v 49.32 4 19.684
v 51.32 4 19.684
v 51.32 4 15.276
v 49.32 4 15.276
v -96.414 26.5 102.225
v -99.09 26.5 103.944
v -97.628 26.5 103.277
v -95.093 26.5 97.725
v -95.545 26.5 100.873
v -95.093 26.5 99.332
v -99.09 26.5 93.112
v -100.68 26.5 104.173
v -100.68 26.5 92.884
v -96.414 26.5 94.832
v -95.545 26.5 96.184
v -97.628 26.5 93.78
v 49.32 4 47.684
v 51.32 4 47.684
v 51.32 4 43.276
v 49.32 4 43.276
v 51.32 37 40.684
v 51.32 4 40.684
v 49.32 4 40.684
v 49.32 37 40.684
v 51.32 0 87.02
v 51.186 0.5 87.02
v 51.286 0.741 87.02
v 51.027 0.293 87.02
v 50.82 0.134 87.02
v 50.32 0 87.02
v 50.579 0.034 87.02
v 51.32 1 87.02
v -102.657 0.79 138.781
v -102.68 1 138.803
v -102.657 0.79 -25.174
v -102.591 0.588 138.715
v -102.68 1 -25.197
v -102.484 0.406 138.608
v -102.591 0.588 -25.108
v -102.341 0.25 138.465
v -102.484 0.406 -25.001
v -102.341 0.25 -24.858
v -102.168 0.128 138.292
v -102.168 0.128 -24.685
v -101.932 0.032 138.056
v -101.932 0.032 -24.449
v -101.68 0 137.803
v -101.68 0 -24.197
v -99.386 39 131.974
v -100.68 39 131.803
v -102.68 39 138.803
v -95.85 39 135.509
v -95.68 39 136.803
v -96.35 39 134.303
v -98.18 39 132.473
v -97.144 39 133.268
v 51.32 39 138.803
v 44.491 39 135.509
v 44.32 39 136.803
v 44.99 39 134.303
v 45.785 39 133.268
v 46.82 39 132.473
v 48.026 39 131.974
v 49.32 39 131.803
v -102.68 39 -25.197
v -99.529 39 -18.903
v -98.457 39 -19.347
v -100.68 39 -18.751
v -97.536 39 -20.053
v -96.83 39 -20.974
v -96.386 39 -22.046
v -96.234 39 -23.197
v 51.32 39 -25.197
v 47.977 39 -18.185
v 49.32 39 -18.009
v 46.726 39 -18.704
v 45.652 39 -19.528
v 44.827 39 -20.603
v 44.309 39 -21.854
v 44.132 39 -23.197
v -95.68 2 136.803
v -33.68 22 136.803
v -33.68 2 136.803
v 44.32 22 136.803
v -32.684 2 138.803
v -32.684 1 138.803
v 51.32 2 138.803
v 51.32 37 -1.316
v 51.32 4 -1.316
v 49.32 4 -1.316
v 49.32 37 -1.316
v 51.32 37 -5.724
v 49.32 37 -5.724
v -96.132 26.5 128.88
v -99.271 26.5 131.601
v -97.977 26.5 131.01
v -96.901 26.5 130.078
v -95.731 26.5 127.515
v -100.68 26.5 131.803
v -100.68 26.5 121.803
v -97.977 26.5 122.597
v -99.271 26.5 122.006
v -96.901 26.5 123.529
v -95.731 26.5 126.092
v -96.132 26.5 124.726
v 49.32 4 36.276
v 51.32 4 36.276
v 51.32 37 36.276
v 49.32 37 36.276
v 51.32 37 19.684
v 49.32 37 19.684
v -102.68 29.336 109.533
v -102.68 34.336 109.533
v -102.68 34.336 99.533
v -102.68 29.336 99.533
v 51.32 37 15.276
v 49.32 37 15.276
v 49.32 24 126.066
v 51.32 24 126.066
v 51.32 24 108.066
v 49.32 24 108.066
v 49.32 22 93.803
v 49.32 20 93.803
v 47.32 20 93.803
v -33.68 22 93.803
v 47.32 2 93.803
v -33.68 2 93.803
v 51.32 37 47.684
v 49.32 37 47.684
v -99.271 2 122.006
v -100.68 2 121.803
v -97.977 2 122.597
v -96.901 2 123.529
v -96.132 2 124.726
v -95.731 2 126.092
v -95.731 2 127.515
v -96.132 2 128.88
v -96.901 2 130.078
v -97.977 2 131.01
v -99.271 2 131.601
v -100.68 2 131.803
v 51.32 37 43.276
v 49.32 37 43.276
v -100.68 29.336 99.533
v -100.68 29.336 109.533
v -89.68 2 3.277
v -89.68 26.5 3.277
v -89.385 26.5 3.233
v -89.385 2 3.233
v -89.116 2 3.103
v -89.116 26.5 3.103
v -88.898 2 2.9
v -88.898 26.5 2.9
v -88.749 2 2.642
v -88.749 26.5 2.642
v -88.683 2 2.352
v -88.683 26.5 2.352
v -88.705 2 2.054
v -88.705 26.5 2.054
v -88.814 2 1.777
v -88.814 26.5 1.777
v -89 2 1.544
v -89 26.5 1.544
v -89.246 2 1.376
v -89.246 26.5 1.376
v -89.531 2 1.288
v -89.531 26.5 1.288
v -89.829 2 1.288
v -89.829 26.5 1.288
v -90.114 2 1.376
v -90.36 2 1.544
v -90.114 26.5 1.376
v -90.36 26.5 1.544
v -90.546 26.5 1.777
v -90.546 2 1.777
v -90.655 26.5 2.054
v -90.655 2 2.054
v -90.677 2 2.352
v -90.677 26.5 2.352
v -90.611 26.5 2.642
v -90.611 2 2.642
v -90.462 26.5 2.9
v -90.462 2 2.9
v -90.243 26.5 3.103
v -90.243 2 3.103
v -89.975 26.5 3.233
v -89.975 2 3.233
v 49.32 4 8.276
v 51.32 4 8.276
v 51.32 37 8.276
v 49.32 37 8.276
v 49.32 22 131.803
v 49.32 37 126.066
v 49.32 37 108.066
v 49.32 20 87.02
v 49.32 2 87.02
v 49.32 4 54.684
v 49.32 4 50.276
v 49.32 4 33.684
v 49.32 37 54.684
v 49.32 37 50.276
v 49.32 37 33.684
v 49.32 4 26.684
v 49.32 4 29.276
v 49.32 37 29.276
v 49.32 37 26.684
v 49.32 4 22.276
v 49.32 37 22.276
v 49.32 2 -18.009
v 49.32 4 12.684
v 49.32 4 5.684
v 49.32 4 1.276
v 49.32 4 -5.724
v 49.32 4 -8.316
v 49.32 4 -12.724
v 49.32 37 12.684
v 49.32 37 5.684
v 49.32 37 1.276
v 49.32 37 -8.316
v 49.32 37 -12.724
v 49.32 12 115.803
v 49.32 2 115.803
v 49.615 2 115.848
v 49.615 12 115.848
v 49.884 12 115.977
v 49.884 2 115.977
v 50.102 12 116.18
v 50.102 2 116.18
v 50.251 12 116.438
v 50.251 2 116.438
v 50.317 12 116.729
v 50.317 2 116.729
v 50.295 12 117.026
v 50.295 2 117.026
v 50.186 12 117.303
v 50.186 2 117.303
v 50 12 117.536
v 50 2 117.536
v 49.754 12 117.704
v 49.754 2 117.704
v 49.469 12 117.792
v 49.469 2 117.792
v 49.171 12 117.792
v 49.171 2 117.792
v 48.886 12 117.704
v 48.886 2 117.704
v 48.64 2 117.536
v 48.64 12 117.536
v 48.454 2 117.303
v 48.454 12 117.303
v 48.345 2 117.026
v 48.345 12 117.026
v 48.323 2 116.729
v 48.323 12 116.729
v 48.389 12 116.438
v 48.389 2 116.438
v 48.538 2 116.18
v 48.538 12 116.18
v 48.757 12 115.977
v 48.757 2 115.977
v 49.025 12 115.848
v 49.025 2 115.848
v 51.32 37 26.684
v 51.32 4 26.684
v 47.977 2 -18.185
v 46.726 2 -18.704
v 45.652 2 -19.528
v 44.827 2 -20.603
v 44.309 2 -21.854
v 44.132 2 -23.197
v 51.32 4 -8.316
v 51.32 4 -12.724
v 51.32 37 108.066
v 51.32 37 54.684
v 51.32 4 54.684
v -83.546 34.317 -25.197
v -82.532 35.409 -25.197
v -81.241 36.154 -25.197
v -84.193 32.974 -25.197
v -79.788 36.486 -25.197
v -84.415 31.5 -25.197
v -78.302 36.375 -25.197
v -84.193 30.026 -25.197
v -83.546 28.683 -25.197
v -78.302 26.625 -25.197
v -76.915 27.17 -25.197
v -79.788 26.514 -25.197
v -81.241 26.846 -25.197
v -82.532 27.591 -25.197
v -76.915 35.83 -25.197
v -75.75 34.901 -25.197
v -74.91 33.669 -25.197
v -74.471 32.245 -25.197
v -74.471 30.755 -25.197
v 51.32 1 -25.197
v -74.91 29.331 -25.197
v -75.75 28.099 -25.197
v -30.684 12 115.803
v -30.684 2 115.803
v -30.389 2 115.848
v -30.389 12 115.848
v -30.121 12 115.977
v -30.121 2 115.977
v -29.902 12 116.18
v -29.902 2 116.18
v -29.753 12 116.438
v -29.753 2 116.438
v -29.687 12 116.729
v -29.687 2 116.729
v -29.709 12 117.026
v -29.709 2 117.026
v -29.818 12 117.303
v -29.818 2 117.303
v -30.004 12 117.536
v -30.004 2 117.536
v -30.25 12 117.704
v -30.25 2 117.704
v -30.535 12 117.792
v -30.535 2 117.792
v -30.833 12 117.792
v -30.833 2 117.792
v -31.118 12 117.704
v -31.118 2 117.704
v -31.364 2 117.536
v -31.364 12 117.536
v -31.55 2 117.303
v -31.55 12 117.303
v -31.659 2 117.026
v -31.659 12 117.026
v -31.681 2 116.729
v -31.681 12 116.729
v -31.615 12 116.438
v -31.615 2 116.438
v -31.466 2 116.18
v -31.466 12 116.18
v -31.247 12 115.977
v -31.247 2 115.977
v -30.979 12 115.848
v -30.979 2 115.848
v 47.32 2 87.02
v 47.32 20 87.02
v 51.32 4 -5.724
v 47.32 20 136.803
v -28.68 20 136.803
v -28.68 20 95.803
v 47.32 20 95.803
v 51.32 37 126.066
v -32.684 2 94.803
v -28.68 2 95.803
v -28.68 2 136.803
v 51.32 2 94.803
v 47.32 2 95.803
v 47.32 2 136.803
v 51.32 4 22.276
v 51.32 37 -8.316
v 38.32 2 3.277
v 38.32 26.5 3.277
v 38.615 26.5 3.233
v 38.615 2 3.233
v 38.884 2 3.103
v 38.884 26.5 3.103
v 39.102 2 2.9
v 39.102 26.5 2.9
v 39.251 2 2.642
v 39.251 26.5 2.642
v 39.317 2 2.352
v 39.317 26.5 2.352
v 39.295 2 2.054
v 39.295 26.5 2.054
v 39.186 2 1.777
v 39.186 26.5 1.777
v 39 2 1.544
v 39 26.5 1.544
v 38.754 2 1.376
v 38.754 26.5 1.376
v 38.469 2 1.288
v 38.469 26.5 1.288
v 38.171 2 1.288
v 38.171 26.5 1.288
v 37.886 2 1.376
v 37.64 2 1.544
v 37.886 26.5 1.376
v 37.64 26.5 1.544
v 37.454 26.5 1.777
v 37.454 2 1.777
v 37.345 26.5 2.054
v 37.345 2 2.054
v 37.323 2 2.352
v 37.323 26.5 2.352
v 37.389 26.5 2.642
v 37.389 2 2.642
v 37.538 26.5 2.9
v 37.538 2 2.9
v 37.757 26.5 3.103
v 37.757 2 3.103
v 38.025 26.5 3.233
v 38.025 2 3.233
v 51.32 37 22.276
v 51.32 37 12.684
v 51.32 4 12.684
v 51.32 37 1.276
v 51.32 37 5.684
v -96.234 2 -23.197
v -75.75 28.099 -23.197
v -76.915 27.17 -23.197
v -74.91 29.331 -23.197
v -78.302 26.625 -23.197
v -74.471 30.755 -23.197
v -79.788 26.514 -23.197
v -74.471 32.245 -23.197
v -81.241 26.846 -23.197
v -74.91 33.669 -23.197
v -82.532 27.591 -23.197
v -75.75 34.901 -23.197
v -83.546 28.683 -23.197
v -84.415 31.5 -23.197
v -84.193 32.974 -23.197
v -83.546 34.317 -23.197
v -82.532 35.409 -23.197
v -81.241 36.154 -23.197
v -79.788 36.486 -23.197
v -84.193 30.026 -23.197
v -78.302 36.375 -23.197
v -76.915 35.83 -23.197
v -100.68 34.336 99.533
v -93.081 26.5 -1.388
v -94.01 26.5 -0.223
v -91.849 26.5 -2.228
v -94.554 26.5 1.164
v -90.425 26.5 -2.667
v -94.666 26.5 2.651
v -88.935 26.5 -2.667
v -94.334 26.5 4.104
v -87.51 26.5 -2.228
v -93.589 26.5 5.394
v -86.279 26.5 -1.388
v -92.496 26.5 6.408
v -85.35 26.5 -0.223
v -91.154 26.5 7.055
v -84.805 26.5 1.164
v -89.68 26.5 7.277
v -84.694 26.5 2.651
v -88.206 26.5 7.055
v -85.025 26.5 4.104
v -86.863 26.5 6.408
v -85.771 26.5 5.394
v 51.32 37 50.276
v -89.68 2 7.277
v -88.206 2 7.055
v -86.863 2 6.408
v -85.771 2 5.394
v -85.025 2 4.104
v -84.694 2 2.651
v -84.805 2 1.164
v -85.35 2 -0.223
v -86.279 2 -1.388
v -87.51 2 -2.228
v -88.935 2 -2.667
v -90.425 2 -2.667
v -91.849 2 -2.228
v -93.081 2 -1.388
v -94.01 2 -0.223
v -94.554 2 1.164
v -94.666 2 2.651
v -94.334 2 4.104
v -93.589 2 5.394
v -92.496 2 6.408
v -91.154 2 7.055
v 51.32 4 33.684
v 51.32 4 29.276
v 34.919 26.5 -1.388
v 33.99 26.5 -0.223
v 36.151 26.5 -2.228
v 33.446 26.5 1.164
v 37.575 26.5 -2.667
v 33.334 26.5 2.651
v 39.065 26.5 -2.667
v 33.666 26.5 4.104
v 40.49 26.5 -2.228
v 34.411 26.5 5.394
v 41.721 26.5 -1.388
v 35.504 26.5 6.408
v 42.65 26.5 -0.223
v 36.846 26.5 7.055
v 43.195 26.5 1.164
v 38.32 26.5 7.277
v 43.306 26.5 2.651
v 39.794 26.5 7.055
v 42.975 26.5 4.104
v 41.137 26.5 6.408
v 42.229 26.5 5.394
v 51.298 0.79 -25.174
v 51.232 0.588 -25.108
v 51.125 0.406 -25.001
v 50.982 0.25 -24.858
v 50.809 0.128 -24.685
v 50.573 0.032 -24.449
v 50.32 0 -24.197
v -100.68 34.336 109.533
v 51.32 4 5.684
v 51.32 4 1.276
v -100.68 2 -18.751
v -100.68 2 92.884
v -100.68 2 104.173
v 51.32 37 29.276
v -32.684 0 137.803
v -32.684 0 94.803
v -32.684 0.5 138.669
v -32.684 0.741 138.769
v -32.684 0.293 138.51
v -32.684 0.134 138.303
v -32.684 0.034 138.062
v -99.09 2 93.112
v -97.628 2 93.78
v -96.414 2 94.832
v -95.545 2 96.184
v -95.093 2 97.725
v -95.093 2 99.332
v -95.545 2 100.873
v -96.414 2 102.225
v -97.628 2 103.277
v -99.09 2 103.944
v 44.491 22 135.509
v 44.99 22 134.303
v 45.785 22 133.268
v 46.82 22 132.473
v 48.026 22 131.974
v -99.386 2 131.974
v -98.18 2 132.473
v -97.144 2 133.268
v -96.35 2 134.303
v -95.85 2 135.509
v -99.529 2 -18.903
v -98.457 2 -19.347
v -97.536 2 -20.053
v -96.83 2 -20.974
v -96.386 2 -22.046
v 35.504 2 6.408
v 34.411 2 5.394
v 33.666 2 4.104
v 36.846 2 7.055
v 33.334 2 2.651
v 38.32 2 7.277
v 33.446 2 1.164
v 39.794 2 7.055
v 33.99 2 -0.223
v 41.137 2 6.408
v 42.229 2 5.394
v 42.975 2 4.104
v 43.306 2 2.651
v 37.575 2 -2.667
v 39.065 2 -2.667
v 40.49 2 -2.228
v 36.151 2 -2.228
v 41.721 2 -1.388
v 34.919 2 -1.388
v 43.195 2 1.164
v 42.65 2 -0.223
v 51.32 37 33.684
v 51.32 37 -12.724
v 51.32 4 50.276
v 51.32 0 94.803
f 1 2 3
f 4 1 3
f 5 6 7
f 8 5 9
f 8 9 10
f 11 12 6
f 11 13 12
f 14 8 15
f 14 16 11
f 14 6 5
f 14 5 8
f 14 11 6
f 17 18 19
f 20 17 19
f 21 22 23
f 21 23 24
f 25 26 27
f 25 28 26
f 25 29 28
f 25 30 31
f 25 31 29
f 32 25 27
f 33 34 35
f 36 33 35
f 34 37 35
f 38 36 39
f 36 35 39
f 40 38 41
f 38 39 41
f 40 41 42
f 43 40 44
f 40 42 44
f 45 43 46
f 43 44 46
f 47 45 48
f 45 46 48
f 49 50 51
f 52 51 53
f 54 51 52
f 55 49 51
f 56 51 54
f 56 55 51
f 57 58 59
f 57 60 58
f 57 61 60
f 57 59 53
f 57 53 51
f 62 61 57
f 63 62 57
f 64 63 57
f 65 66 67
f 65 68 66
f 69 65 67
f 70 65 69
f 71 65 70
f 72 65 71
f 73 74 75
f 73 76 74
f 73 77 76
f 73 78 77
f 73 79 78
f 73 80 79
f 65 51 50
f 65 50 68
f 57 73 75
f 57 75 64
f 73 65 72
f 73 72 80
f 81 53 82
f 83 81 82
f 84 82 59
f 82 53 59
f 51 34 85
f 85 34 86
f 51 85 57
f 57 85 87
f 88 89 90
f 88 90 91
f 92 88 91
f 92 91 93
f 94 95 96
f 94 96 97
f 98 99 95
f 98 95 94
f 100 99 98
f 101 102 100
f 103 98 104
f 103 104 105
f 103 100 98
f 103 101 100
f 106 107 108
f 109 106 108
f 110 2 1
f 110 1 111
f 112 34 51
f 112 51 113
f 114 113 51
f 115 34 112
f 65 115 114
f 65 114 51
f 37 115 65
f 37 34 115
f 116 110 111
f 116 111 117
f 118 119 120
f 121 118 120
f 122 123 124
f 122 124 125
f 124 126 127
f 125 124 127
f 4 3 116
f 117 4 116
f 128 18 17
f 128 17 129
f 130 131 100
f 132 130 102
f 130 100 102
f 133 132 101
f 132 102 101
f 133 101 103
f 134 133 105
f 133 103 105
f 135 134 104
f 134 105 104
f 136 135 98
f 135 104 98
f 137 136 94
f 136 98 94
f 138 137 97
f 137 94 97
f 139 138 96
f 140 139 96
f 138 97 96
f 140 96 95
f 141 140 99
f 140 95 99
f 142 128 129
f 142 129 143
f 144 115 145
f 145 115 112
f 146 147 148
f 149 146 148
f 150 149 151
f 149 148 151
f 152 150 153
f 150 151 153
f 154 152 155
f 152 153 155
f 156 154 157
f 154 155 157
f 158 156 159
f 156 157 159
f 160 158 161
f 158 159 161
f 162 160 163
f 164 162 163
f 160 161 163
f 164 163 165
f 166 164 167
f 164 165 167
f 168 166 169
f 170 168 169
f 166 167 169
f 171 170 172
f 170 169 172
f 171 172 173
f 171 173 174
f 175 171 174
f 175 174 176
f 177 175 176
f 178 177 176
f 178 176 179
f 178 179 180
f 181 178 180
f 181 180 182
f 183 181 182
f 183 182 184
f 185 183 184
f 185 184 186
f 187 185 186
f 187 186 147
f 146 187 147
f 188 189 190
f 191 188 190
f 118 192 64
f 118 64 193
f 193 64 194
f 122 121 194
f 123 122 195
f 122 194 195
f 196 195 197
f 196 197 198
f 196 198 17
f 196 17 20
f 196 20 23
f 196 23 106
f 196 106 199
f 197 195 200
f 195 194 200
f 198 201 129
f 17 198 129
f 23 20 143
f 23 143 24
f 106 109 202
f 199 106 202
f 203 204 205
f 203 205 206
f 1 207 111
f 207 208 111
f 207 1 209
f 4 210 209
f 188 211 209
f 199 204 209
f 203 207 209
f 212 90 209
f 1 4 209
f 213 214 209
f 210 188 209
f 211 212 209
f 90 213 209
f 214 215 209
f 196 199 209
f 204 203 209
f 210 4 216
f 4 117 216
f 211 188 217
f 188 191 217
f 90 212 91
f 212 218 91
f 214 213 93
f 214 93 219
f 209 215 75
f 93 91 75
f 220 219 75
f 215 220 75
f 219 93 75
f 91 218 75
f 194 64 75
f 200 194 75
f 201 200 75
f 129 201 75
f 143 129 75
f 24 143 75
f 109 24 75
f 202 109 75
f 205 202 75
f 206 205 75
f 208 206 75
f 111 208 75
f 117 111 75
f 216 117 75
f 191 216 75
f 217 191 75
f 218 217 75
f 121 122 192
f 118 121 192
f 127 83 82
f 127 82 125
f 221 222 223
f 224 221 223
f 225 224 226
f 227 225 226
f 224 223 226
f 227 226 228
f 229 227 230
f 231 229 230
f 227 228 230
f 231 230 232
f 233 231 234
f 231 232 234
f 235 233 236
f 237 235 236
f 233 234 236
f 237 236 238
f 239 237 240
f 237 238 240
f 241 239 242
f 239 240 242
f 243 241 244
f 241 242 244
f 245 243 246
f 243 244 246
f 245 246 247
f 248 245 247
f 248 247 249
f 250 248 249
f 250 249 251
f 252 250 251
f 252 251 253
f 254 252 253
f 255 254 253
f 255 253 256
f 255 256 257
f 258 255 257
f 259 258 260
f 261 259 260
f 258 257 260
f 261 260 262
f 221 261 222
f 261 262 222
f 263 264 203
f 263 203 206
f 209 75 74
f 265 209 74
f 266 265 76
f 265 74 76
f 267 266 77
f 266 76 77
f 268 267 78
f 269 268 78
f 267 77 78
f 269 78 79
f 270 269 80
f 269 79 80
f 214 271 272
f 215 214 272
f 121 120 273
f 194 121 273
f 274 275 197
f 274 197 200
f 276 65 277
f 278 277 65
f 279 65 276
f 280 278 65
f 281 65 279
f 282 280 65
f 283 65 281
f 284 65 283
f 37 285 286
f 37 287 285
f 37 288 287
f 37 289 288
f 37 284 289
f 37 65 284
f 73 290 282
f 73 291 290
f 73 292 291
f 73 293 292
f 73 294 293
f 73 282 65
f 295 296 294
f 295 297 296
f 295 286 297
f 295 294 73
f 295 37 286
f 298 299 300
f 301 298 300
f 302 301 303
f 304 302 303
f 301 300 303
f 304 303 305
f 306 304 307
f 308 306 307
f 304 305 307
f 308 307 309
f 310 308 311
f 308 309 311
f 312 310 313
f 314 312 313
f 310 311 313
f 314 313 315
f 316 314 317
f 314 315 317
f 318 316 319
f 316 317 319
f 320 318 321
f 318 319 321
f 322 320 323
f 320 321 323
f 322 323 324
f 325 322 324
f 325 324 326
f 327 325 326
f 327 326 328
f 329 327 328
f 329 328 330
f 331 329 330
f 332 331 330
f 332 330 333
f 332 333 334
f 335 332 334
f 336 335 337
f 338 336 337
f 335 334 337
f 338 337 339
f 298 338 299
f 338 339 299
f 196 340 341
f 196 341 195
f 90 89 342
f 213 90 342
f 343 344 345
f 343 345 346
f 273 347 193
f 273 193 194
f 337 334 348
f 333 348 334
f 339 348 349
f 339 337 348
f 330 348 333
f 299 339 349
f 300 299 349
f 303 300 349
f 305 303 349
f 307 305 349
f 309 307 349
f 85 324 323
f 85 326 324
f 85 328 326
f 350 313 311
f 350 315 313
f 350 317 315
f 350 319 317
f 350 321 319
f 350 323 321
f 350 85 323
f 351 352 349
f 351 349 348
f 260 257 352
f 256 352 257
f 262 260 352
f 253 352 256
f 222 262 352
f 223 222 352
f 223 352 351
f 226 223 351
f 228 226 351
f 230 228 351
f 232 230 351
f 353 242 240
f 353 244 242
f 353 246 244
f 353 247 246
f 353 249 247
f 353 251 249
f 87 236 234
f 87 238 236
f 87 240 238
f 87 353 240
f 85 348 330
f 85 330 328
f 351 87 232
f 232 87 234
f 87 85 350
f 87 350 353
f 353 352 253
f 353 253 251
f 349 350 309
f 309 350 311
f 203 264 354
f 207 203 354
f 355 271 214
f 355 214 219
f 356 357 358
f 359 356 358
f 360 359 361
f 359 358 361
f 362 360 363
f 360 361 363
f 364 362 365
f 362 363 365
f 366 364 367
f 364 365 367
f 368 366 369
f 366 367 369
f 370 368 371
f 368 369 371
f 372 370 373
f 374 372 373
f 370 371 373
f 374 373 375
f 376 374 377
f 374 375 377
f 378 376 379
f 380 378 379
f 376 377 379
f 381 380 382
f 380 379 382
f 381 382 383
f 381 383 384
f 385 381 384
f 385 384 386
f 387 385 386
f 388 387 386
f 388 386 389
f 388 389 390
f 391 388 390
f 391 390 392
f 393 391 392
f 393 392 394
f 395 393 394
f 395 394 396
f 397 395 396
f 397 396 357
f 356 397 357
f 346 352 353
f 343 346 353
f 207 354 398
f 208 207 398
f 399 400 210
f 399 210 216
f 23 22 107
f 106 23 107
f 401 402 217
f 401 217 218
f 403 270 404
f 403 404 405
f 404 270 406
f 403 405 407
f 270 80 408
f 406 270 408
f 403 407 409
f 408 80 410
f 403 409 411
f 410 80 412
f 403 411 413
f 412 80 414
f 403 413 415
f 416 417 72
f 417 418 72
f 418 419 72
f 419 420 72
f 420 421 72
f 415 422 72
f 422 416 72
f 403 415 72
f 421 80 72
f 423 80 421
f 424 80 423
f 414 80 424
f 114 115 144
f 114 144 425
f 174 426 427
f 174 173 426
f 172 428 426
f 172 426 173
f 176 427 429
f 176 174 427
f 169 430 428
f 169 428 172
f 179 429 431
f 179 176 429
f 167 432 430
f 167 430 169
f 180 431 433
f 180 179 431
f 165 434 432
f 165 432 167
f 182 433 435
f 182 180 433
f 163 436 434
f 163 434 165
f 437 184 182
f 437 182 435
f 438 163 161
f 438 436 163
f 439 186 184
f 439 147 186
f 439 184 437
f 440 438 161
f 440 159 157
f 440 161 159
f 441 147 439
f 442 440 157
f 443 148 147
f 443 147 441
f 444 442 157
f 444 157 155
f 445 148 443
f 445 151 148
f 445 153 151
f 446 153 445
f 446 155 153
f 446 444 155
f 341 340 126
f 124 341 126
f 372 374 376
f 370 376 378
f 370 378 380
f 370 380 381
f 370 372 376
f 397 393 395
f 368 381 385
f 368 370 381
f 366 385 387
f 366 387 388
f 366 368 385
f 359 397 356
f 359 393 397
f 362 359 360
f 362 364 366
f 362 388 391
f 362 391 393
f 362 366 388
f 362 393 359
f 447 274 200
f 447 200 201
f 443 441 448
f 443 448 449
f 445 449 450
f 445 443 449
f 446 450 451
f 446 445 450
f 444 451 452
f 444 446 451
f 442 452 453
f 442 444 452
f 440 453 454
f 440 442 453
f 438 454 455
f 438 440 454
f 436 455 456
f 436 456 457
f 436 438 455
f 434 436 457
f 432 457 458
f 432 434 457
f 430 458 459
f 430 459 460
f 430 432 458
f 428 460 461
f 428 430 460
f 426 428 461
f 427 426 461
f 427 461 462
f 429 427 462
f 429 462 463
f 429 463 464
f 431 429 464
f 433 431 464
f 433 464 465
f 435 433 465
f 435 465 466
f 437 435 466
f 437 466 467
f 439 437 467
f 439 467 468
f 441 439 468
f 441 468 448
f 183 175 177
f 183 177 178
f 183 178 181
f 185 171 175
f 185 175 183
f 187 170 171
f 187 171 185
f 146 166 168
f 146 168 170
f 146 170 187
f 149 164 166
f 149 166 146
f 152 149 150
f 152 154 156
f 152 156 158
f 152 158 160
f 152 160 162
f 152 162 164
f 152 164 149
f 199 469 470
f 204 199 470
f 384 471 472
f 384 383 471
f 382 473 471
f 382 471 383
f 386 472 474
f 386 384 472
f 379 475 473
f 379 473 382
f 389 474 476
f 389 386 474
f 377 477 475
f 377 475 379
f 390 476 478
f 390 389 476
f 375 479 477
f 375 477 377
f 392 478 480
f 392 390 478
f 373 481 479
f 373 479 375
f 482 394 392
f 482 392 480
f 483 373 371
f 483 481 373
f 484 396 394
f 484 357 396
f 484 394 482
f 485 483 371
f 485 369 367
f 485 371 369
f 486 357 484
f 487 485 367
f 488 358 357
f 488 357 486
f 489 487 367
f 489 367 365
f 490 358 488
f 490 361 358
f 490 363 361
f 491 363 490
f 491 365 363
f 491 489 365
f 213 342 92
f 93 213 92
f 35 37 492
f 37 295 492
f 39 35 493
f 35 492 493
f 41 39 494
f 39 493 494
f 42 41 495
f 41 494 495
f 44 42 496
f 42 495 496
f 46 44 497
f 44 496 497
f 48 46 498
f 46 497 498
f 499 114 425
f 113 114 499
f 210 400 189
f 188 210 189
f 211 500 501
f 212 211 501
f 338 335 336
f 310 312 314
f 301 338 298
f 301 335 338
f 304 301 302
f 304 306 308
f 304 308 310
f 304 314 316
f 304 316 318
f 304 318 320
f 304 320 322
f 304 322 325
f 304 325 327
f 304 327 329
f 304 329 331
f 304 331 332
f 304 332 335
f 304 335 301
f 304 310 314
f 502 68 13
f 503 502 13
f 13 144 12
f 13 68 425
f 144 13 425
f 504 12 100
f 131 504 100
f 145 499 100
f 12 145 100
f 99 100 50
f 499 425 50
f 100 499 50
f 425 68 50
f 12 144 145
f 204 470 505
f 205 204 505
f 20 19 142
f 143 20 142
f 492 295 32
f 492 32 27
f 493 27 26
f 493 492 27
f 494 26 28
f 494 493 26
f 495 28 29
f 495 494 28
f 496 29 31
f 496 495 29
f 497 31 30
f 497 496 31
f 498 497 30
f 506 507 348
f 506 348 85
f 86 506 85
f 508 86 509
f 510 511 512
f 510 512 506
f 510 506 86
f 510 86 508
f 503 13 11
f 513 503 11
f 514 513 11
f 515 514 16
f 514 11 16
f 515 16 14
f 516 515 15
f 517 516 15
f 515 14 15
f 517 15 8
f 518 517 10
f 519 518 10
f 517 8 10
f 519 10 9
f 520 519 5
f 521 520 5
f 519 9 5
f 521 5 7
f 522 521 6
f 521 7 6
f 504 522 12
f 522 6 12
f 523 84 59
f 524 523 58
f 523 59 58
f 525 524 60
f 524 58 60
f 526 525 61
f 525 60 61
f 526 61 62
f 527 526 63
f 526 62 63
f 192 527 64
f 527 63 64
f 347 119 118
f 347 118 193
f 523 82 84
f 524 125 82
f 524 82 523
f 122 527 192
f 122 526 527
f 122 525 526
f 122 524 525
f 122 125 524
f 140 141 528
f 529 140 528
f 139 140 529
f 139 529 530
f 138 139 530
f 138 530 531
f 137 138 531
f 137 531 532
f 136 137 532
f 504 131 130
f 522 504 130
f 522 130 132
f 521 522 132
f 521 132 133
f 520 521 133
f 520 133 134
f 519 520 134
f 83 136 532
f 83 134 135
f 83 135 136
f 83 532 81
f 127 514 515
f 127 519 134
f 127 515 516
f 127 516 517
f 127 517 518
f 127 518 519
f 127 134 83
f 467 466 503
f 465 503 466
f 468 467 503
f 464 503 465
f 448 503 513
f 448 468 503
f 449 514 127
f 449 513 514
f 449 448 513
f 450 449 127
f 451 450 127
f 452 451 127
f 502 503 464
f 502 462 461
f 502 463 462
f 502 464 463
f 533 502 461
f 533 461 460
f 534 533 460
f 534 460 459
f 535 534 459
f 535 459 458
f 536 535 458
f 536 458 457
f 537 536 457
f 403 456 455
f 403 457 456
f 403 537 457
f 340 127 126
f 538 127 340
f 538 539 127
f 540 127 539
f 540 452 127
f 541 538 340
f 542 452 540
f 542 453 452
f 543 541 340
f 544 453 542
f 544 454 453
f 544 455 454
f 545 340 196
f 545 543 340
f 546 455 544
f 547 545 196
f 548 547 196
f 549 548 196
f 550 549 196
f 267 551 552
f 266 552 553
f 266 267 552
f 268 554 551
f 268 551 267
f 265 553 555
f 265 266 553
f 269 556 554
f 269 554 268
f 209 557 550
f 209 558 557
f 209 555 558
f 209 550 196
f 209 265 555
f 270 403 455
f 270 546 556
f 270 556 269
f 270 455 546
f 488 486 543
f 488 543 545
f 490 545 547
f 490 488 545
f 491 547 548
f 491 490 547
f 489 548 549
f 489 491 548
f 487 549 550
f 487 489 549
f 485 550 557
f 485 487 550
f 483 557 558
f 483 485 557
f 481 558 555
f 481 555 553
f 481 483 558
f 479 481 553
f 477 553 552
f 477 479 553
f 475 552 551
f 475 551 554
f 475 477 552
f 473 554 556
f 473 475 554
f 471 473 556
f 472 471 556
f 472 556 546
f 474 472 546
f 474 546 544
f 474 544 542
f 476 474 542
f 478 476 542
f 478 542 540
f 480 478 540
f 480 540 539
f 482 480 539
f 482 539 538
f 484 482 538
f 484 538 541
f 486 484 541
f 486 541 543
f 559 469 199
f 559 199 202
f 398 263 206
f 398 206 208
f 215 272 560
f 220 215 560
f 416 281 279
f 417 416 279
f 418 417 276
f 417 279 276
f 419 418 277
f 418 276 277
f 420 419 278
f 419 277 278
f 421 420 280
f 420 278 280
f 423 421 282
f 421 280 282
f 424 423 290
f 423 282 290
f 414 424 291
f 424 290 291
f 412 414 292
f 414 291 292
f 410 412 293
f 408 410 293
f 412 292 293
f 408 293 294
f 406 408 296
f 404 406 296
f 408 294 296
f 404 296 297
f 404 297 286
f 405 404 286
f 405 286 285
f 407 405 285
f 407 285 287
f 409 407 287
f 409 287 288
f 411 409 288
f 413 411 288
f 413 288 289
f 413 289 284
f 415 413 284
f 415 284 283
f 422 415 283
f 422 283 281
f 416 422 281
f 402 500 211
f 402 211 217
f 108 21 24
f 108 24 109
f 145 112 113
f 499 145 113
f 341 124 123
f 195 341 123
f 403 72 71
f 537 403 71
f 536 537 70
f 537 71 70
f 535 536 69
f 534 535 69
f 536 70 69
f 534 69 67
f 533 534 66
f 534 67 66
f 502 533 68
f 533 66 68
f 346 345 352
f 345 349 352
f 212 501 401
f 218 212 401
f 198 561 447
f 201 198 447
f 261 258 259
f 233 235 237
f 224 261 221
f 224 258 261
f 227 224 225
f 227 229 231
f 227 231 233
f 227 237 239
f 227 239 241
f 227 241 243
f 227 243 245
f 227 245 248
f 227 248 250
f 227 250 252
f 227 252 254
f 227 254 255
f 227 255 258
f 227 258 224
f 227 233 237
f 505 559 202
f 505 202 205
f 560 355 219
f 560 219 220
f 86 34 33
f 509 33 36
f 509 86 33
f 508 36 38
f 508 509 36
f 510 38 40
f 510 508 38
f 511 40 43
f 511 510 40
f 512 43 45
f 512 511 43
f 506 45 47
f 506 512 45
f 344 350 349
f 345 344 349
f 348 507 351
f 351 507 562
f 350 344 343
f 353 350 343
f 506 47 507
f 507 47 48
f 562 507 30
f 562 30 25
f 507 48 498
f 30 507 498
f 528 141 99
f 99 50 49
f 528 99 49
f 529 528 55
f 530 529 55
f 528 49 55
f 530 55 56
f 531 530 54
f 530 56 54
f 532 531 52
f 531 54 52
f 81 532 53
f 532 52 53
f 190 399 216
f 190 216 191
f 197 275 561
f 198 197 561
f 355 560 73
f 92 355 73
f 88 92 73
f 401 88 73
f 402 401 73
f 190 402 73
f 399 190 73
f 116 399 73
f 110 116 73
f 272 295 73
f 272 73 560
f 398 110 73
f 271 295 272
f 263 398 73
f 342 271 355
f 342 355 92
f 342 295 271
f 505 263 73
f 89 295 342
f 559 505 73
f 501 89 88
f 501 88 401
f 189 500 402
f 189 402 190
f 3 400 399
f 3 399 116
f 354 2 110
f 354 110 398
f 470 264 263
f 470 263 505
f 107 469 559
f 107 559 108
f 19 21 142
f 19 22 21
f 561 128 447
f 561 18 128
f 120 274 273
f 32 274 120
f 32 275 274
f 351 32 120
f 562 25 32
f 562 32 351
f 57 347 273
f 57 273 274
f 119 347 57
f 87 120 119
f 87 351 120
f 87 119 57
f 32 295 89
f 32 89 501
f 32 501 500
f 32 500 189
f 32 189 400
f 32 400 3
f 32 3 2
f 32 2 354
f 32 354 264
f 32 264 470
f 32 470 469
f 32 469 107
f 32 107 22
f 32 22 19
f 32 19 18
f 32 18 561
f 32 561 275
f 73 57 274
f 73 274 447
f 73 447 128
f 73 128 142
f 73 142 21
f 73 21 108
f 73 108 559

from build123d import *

# Parameters (mm, degrees)
SKETCH1_W               = 154
SKETCH1_H               = 164
BOSS_EXTRUDE1_DEPTH     = 39
FILLET2_R               = 1
SKETCH2_R               = 5
SKETCH2_R_2             = 1
CUT_EXTRUDE1_DEPTH      = 37
CUT_EXTRUDE2_DEPTH      = 178.004271116
CUT_EXTRUDE2_DEPTH_BACK = 12.5
SKETCH3_R               = 5
SKETCH4_W               = 76
SKETCH4_H               = 41
CUT_EXTRUDE3_DEPTH      = 20
SKETCH5_W               = 80
SKETCH5_H               = 2
BOSS_EXTRUDE2_DEPTH     = 18
SKETCH7_W               = 85
SKETCH7_H               = 45
BOSS_EXTRUDE3_DEPTH     = 2
SKETCH8_W               = 18
SKETCH8_H               = 13
CUT_EXTRUDE4_DEPTH      = 3
SKETCH10_W              = 4
SKETCH10_H              = 51.783631986
BOSS_EXTRUDE4_DEPTH     = 20
SKETCH11_W              = 84.004327952
SKETCH11_H              = 44
CUT_EXTRUDE8_DEPTH      = 2
SKETCH12_W              = 4.408390859
SKETCH12_H              = 33
CUT_EXTRUDE9_DEPTH      = 3
SKETCH13_R              = 5
CUT_EXTRUDE10_DEPTH     = 10
SKETCH14_W              = 10
SKETCH14_H              = 5
CUT_EXTRUDE11_DEPTH     = 10
SKETCH15_R              = 1
CUT_EXTRUDE12_DEPTH     = 10


with BuildPart() as part:
    # Sketch1 → Boss-Extrude1 (new body)
    with BuildSketch(Plane(origin=(0, 0, 0), x_dir=(1, 0, 0), z_dir=(0, 1, 0))):
        with Locations((-25.679775281, -56.803370787)):
            Rectangle(SKETCH1_W, SKETCH1_H)
    extrude(amount=BOSS_EXTRUDE1_DEPTH)

    # Fillet2
    fillet2_edges = [part.edges().sort_by_distance(p)[0] for p in [
        (-25.679775281, 0, -25.196629213),
        (51.320224719, 0, 56.803370787),
        (-25.679775281, 0, 138.803370787),
        (-102.679775281, 0, 56.803370787),
    ]]
    fillet(fillet2_edges, radius=FILLET2_R)

    # Sketch2 → Cut-Extrude1 (cut)
    # profile 1 of 3: a face of its own
    with BuildSketch(Plane(origin=(0, 39, 0), x_dir=(1, 0, 0), z_dir=(0, 1, 0))):
        with BuildLine():
            Line((44.132250696, 23.196629213), (-96.23424538, 23.196629213))
            ThreePointArc((-96.23424538, 23.196629213), (-97.536310942, 20.053164875), (-100.679775281, 18.751099313))
            Line((-100.679775281, 18.751099313), (-100.679775281, -92.88384898))
            ThreePointArc((-100.679775281, -92.88384898), (-95.035253474, -98.528370787), (-100.679775281, -104.172892593))
            Line((-100.679775281, -104.172892593), (-100.679775281, -121.803370787))
            ThreePointArc((-100.679775281, -121.803370787), (-95.679775281, -126.803370787), (-100.679775281, -131.803370787))
            ThreePointArc((-100.679775281, -131.803370787), (-97.144241375, -133.267836881), (-95.679775281, -136.803370787))
            Line((-95.679775281, -136.803370787), (44.320224719, -136.803370787))
            ThreePointArc((44.320224719, -136.803370787), (45.784690813, -133.267836881), (49.320224719, -131.803370787))
            Line((49.320224719, -131.803370787), (49.320224719, 18.00865519))
            ThreePointArc((49.320224719, 18.00865519), (45.651773106, 19.528177601), (44.132250696, 23.196629213))
        make_face()
        with Locations(Location((-89.679775281, -2.276961684, 0), (0, 0, 270))):
            Circle(SKETCH2_R, mode=Mode.SUBTRACT)
        with Locations(Location((38.320224719, -2.276961684, 0), (0, 0, 270))):
            Circle(SKETCH2_R, mode=Mode.SUBTRACT)
    # profile 2 of 3: a face of its own
    with BuildSketch(Plane(origin=(0, 39, 0), x_dir=(1, 0, 0), z_dir=(0, 1, 0))):
        with Locations(Location((-89.679775281, -2.276961684, 0), (0, 0, 270))):
            Circle(SKETCH2_R_2)
    # profile 3 of 3: a face of its own
    with BuildSketch(Plane(origin=(0, 39, 0), x_dir=(1, 0, 0), z_dir=(0, 1, 0))):
        with Locations(Location((38.320224719, -2.276961684, 0), (0, 0, 270))):
            Circle(SKETCH2_R_2)
    extrude(amount=-CUT_EXTRUDE1_DEPTH, mode=Mode.SUBTRACT)

    # Sketch3 → Cut-Extrude2 (cut, two sides: drawn at the far end of the back side and taken through both)
    with BuildSketch(Plane(origin=(0, 39, 0), x_dir=(1, 0, 0), z_dir=(0, 1, 0)).offset(-CUT_EXTRUDE2_DEPTH_BACK)):
        with Locations(Location((-89.679775281, -2.276961684, 0), (0, 0, 270))):
            Circle(SKETCH3_R)
        with Locations(Location((38.320224719, -2.276961684, 0), (0, 0, 270))):
            Circle(SKETCH3_R)
        with BuildLine():
            Line((-100.679775281, -92.528370787), (-100.679775281, -104.528370787))
            ThreePointArc((-100.679775281, -104.528370787), (-94.679775281, -98.528370787), (-100.679775281, -92.528370787))
        make_face()
        with BuildLine():
            Line((-100.679775281, -121.803370787), (-100.679775281, -131.803370787))
            ThreePointArc((-100.679775281, -131.803370787), (-95.679775281, -126.803370787), (-100.679775281, -121.803370787))
        make_face()
    extrude(amount=CUT_EXTRUDE2_DEPTH + CUT_EXTRUDE2_DEPTH_BACK, mode=Mode.SUBTRACT)

    # Sketch4 → Cut-Extrude3 (cut)
    with BuildSketch(Plane.XZ):
        with Locations((9.320224719, 116.303370787)):
            Rectangle(SKETCH4_W, SKETCH4_H)
    extrude(amount=-CUT_EXTRUDE3_DEPTH, mode=Mode.SUBTRACT)

    # Sketch5 → Boss-Extrude2 (add)
    with BuildSketch(Plane(origin=(0, 2, 0), x_dir=(1, 0, 0), z_dir=(0, 1, 0))):
        with Locations((11.320224719, -94.803370787)):
            Rectangle(SKETCH5_W, SKETCH5_H)
        Polygon((-28.679775281, -95.803370787), (-28.679775281, -93.803370787), (-33.679775281, -93.803370787), (-33.679775281, -136.803370787), (-28.679775281, -136.803370787), align=None)
    extrude(amount=BOSS_EXTRUDE2_DEPTH)

    # Sketch7 → Boss-Extrude3 (add)
    with BuildSketch(Plane(origin=(0, 20, 0), x_dir=(1, 0, 0), z_dir=(0, 1, 0))):
        with Locations((8.820224719, -116.303370787)):
            Rectangle(SKETCH7_W, SKETCH7_H)
    extrude(amount=BOSS_EXTRUDE3_DEPTH)

    # Sketch8 → Cut-Extrude4 (cut)
    with BuildSketch(Plane(origin=(51.320224719, 0, 0), x_dir=(0, 0, -1), z_dir=(1, 0, 0))):
        with Locations((-117.065973314, 30.5)):
            Rectangle(SKETCH8_W, SKETCH8_H)
    extrude(amount=-CUT_EXTRUDE4_DEPTH, mode=Mode.SUBTRACT)

    # Sketch10 → Boss-Extrude4 (add)
    with BuildSketch(Plane.XZ):
        with Locations((49.320224719, 112.911554794)):
            Rectangle(SKETCH10_W, SKETCH10_H)
    extrude(amount=-BOSS_EXTRUDE4_DEPTH)

    # Sketch11 → Cut-Extrude8 (cut)
    with BuildSketch(Plane.XZ):
        with Locations((9.318060743, 116.803370787)):
            Rectangle(SKETCH11_W, SKETCH11_H)
    extrude(amount=-CUT_EXTRUDE8_DEPTH, mode=Mode.SUBTRACT)

    # Sketch12 → Cut-Extrude9 (cut)
    with BuildSketch(Plane(origin=(51.320224719, 0, 0), x_dir=(0, 0, -1), z_dir=(1, 0, 0))):
        with Locations((-52.479756675, 20.5)):
            Rectangle(SKETCH12_W, SKETCH12_H)
        with Locations((-45.479756675, 20.5)):
            Rectangle(SKETCH12_W, SKETCH12_H)
        with Locations((-38.479756675, 20.5)):
            Rectangle(SKETCH12_W, SKETCH12_H)
        with Locations((-31.479756676, 20.5)):
            Rectangle(SKETCH12_W, SKETCH12_H)
        with Locations((-24.479756676, 20.5)):
            Rectangle(SKETCH12_W, SKETCH12_H)
        with Locations((-17.479756675, 20.5)):
            Rectangle(SKETCH12_W, SKETCH12_H)
        with Locations((-10.479756676, 20.5)):
            Rectangle(SKETCH12_W, SKETCH12_H)
        with Locations((-3.479756676, 20.5)):
            Rectangle(SKETCH12_W, SKETCH12_H)
        with Locations((3.520243324, 20.5)):
            Rectangle(SKETCH12_W, SKETCH12_H)
        with Locations((10.520243325, 20.5)):
            Rectangle(SKETCH12_W, SKETCH12_H)
    extrude(amount=-CUT_EXTRUDE9_DEPTH, mode=Mode.SUBTRACT)

    # Sketch13 → Cut-Extrude10 (cut)
    with BuildSketch(Plane(origin=(0, 0, -25.196629213), x_dir=(-1, 0, 0), z_dir=(0, 0, -1))):
        with Locations((79.41479284, 31.5)):
            Circle(SKETCH13_R)
    extrude(amount=-CUT_EXTRUDE10_DEPTH, mode=Mode.SUBTRACT)

    # Sketch14 → Cut-Extrude11 (cut)
    with BuildSketch(Plane.ZY.offset(102.679775281)):
        with Locations((104.532679505, 31.835930774)):
            Rectangle(SKETCH14_W, SKETCH14_H)
    extrude(amount=-CUT_EXTRUDE11_DEPTH, mode=Mode.SUBTRACT)

    # Sketch15 → Cut-Extrude12 (cut)
    with BuildSketch(Plane.XZ.offset(-2)):
        with Locations(Location((-30.684103233, 116.803370787, 0), (0, 0, 270))):
            Circle(SKETCH15_R)
        with Locations(Location((49.320224719, 116.803370787, 0), (0, 0, 270))):
            Circle(SKETCH15_R)
    extrude(amount=-CUT_EXTRUDE12_DEPTH, mode=Mode.SUBTRACT)


solid = part.part
